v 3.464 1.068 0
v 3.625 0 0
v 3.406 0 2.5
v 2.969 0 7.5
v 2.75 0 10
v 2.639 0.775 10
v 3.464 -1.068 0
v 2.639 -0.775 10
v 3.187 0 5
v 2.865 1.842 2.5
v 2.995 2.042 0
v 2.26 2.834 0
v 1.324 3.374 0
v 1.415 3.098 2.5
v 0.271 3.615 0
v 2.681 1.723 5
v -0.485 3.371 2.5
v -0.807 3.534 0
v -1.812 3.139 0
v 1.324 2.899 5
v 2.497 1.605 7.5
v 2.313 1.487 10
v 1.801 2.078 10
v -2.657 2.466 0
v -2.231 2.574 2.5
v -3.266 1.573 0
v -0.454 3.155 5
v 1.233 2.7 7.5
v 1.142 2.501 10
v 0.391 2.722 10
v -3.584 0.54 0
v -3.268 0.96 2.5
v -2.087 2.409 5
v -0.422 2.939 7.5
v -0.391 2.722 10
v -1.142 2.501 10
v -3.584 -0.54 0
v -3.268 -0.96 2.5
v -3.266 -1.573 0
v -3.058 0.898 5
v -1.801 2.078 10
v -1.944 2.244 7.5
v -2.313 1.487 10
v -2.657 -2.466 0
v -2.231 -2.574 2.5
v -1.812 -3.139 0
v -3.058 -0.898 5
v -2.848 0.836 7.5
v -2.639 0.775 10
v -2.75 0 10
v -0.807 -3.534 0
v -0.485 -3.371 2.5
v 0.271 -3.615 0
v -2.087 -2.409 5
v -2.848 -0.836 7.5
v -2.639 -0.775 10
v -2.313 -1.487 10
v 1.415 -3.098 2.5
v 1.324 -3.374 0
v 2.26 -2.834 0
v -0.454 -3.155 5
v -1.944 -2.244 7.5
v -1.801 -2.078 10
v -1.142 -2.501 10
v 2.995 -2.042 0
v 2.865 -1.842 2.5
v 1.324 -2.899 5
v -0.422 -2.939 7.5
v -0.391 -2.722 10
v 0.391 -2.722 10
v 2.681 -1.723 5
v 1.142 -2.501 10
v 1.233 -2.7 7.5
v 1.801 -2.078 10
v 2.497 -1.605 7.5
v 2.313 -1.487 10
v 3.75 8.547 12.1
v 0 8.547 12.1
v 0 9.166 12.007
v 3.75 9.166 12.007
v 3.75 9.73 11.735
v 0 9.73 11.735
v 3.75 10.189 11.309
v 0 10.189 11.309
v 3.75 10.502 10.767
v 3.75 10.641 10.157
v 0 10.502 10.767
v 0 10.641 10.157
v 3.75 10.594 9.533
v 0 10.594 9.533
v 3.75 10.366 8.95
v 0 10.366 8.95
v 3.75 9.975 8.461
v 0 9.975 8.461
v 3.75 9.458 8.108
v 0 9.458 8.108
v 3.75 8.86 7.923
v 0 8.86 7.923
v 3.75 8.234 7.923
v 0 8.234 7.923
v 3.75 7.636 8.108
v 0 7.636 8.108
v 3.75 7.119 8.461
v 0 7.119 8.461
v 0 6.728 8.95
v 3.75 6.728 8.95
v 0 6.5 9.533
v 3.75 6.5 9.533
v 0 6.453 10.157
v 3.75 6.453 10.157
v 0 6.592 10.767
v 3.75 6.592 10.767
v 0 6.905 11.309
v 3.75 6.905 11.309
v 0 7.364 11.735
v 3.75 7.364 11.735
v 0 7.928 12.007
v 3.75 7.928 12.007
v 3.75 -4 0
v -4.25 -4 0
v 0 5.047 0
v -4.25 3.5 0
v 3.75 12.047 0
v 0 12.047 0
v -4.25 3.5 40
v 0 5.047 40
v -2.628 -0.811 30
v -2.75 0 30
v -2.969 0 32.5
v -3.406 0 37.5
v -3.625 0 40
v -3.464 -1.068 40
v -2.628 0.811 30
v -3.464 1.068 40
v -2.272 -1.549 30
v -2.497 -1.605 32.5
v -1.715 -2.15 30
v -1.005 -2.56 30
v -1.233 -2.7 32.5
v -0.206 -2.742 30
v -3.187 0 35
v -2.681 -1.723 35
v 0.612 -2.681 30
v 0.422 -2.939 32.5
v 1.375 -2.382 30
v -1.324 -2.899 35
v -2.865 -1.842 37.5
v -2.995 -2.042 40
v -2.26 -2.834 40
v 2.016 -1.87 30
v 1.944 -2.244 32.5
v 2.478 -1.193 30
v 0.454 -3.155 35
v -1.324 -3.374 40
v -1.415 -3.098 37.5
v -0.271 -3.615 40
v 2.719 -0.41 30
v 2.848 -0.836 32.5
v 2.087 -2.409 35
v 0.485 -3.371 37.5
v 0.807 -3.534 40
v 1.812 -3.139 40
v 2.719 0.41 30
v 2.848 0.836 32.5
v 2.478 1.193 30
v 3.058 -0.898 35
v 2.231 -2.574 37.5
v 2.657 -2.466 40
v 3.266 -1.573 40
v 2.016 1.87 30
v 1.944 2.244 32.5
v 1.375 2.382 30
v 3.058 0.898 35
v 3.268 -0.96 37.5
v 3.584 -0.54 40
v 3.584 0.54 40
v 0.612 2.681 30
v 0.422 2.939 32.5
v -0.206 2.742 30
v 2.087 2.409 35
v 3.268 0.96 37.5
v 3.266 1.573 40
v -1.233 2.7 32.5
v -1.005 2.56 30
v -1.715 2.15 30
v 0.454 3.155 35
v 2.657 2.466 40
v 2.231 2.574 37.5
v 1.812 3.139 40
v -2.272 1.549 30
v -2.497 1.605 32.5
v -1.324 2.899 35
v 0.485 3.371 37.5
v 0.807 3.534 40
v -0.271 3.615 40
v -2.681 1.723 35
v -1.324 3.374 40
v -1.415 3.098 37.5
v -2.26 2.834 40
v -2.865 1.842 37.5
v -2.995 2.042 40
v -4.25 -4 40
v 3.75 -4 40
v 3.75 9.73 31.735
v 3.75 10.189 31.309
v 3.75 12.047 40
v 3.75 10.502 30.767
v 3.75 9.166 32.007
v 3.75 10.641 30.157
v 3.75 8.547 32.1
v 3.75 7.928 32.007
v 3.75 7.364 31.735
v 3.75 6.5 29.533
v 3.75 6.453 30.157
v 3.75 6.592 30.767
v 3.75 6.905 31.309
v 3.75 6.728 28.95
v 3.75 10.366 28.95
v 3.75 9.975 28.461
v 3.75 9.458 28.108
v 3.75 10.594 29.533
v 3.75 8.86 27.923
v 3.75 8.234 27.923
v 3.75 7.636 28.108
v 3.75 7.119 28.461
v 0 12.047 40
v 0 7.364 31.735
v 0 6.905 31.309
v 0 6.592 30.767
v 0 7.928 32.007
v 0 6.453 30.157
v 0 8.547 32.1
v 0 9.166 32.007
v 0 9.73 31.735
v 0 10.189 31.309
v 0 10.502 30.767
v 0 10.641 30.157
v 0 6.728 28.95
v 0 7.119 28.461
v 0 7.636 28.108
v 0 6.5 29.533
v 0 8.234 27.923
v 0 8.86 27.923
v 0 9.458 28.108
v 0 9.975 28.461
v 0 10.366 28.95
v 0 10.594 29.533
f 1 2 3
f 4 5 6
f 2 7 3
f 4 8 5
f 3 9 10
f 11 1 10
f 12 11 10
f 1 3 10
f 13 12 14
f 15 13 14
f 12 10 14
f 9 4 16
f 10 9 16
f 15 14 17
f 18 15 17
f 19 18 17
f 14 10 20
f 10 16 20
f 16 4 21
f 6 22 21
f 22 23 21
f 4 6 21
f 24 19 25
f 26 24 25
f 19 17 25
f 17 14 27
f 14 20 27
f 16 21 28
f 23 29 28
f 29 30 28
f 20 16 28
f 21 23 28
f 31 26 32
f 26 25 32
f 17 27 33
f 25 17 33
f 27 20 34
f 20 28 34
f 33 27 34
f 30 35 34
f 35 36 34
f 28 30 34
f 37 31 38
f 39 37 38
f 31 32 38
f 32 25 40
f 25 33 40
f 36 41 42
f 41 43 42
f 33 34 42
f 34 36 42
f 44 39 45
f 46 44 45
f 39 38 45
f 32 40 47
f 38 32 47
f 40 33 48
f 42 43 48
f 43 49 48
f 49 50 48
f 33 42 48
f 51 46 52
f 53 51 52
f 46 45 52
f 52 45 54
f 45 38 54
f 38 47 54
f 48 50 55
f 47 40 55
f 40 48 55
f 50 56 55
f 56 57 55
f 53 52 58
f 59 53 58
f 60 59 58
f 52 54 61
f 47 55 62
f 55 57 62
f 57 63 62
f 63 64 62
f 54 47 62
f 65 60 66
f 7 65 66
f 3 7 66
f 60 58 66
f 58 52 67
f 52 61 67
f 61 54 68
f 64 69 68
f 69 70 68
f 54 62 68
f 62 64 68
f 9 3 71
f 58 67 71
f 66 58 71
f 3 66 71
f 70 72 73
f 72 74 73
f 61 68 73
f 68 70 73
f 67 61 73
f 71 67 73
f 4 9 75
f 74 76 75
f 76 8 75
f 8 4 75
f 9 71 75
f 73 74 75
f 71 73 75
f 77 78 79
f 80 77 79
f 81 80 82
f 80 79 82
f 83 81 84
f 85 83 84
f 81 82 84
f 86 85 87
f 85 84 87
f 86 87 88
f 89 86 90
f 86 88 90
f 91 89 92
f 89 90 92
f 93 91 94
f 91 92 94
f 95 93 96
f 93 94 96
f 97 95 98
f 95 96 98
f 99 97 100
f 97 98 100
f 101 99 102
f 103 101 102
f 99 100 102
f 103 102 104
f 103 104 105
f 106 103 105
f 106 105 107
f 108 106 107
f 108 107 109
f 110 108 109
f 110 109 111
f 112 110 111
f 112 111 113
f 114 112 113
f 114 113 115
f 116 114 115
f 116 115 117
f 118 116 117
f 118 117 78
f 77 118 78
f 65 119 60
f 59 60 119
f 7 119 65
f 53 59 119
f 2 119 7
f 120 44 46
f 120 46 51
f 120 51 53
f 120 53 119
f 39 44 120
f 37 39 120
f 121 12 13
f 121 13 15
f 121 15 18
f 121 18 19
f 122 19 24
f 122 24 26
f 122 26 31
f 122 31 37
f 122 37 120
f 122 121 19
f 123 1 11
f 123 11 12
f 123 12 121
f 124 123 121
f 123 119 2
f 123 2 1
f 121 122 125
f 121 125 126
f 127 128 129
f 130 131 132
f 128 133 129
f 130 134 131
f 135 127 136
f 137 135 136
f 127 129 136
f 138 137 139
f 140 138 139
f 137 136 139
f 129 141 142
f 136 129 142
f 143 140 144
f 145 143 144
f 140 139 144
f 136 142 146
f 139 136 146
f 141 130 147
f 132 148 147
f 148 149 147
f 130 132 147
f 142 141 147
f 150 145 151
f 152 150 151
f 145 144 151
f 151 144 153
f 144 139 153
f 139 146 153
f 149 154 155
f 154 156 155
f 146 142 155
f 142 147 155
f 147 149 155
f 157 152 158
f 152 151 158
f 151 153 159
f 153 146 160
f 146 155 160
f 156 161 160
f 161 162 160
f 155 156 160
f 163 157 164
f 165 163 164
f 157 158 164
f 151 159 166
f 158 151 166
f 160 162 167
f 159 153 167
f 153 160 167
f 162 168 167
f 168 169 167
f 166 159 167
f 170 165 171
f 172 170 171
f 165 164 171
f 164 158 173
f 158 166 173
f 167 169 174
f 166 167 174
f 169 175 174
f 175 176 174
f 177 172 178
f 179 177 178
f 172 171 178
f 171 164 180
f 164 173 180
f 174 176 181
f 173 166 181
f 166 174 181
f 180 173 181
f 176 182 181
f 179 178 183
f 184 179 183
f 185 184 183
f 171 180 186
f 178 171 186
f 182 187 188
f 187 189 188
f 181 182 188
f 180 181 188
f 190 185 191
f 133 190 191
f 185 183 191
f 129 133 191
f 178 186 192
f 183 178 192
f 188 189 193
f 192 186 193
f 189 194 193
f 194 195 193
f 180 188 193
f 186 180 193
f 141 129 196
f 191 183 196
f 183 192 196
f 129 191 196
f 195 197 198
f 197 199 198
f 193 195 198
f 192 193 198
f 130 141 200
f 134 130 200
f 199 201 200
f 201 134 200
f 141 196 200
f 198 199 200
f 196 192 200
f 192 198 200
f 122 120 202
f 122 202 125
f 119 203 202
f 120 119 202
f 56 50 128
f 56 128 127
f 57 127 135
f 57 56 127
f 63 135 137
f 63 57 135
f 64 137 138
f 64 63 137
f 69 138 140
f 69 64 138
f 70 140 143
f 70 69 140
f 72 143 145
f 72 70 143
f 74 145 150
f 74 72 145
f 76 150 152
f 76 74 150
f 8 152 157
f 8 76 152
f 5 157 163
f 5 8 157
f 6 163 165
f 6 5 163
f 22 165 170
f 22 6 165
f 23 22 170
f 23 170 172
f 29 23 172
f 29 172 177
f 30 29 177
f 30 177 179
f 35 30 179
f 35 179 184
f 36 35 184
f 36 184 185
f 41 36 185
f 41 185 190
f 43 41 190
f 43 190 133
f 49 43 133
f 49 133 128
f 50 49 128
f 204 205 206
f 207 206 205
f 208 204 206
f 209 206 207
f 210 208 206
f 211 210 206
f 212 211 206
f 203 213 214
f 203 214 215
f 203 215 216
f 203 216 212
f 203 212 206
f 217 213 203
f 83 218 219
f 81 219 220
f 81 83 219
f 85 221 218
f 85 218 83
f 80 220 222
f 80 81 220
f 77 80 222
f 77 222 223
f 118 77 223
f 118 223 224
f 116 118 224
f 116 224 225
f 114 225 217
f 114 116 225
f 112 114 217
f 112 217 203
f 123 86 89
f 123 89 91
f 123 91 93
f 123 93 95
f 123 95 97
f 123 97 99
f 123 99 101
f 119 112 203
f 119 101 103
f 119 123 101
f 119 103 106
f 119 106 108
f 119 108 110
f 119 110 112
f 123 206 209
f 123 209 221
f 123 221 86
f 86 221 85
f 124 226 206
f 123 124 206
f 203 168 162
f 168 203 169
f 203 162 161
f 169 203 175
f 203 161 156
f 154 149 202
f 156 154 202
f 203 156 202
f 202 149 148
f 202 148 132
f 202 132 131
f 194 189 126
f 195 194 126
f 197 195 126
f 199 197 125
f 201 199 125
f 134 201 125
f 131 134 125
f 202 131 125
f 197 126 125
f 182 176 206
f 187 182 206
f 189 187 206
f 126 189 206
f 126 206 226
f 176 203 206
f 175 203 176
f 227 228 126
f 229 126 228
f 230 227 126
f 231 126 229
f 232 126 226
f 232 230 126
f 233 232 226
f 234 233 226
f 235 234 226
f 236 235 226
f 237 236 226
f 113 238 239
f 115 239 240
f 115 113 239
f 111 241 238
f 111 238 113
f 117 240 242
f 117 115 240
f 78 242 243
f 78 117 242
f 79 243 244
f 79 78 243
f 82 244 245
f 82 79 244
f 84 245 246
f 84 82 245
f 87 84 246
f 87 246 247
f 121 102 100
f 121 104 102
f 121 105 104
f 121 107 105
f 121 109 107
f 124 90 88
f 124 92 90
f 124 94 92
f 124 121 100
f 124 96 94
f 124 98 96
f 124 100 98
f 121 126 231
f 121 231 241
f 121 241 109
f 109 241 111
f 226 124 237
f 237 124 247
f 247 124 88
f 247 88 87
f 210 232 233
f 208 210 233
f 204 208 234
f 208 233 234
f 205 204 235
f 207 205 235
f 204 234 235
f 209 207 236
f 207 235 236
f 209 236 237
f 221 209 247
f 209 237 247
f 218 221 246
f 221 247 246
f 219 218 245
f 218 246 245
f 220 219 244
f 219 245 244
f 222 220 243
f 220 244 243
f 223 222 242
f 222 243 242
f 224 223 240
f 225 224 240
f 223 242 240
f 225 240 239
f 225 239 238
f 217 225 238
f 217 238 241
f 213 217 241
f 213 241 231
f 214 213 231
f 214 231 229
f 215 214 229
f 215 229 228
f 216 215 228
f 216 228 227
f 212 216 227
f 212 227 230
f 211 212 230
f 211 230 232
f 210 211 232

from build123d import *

# Parameters (mm, degrees)
BOSS_EXTRUDE1_DEPTH = 40
SKETCH2_R           = 2.1
CUT_EXTRUDE1_DEPTH  = 42.990351999
CHAMFER1_SIZE       = 10
CHAMFER1_SIZE2      = 0.874886635


with BuildPart() as part:
    # Sketch1 → Boss-Extrude1 (new body)
    with BuildSketch(Plane.XY):
        Polygon((-4.25, -4), (-4.25, 3.5), (0, 5.046873496), (0, 12.046873496), (3.75, 12.046873496), (3.75, -4), align=None)
        with BuildLine():
            ThreePointArc((2.75, 0), (0, 2.75), (-2.75, 0))
            ThreePointArc((-2.75, 0), (0, -2.75), (2.75, 0))
        make_face(mode=Mode.SUBTRACT)
    extrude(amount=BOSS_EXTRUDE1_DEPTH)

    # Sketch2 → Cut-Extrude1 (cut, through all)
    with BuildSketch(Plane.ZY):
        with Locations((10, 8.546873496)):
            Circle(SKETCH2_R)
        with Locations((30, 8.546873496)):
            Circle(SKETCH2_R)
    extrude(amount=-CUT_EXTRUDE1_DEPTH, mode=Mode.SUBTRACT)

    # Chamfer1
    chamfer1_edges = [part.edges().sort_by_distance(p)[0] for p in [
        (-2.75, 0, 40),
    ]]
    chamfer1_side = [part.faces().sort_by_distance(p)[0] for p in [
        (-2.75, 0, 20),
    ]]
    chamfer(chamfer1_edges, length=CHAMFER1_SIZE, length2=CHAMFER1_SIZE2, reference=chamfer1_side[0])

    # Chamfer2: read off the stored shape, not the designer's step
    # Chamfer2 outline → Chamfer2 (revolve, cut)
    with BuildSketch(Plane.XZ):
        Polygon((3.624886635, 0), (2.75, 10), (2.75, 0), align=None)
    revolve(axis=Axis((0, 0, 0), (0, 0, 1)), mode=Mode.SUBTRACT)


solid = part.part
